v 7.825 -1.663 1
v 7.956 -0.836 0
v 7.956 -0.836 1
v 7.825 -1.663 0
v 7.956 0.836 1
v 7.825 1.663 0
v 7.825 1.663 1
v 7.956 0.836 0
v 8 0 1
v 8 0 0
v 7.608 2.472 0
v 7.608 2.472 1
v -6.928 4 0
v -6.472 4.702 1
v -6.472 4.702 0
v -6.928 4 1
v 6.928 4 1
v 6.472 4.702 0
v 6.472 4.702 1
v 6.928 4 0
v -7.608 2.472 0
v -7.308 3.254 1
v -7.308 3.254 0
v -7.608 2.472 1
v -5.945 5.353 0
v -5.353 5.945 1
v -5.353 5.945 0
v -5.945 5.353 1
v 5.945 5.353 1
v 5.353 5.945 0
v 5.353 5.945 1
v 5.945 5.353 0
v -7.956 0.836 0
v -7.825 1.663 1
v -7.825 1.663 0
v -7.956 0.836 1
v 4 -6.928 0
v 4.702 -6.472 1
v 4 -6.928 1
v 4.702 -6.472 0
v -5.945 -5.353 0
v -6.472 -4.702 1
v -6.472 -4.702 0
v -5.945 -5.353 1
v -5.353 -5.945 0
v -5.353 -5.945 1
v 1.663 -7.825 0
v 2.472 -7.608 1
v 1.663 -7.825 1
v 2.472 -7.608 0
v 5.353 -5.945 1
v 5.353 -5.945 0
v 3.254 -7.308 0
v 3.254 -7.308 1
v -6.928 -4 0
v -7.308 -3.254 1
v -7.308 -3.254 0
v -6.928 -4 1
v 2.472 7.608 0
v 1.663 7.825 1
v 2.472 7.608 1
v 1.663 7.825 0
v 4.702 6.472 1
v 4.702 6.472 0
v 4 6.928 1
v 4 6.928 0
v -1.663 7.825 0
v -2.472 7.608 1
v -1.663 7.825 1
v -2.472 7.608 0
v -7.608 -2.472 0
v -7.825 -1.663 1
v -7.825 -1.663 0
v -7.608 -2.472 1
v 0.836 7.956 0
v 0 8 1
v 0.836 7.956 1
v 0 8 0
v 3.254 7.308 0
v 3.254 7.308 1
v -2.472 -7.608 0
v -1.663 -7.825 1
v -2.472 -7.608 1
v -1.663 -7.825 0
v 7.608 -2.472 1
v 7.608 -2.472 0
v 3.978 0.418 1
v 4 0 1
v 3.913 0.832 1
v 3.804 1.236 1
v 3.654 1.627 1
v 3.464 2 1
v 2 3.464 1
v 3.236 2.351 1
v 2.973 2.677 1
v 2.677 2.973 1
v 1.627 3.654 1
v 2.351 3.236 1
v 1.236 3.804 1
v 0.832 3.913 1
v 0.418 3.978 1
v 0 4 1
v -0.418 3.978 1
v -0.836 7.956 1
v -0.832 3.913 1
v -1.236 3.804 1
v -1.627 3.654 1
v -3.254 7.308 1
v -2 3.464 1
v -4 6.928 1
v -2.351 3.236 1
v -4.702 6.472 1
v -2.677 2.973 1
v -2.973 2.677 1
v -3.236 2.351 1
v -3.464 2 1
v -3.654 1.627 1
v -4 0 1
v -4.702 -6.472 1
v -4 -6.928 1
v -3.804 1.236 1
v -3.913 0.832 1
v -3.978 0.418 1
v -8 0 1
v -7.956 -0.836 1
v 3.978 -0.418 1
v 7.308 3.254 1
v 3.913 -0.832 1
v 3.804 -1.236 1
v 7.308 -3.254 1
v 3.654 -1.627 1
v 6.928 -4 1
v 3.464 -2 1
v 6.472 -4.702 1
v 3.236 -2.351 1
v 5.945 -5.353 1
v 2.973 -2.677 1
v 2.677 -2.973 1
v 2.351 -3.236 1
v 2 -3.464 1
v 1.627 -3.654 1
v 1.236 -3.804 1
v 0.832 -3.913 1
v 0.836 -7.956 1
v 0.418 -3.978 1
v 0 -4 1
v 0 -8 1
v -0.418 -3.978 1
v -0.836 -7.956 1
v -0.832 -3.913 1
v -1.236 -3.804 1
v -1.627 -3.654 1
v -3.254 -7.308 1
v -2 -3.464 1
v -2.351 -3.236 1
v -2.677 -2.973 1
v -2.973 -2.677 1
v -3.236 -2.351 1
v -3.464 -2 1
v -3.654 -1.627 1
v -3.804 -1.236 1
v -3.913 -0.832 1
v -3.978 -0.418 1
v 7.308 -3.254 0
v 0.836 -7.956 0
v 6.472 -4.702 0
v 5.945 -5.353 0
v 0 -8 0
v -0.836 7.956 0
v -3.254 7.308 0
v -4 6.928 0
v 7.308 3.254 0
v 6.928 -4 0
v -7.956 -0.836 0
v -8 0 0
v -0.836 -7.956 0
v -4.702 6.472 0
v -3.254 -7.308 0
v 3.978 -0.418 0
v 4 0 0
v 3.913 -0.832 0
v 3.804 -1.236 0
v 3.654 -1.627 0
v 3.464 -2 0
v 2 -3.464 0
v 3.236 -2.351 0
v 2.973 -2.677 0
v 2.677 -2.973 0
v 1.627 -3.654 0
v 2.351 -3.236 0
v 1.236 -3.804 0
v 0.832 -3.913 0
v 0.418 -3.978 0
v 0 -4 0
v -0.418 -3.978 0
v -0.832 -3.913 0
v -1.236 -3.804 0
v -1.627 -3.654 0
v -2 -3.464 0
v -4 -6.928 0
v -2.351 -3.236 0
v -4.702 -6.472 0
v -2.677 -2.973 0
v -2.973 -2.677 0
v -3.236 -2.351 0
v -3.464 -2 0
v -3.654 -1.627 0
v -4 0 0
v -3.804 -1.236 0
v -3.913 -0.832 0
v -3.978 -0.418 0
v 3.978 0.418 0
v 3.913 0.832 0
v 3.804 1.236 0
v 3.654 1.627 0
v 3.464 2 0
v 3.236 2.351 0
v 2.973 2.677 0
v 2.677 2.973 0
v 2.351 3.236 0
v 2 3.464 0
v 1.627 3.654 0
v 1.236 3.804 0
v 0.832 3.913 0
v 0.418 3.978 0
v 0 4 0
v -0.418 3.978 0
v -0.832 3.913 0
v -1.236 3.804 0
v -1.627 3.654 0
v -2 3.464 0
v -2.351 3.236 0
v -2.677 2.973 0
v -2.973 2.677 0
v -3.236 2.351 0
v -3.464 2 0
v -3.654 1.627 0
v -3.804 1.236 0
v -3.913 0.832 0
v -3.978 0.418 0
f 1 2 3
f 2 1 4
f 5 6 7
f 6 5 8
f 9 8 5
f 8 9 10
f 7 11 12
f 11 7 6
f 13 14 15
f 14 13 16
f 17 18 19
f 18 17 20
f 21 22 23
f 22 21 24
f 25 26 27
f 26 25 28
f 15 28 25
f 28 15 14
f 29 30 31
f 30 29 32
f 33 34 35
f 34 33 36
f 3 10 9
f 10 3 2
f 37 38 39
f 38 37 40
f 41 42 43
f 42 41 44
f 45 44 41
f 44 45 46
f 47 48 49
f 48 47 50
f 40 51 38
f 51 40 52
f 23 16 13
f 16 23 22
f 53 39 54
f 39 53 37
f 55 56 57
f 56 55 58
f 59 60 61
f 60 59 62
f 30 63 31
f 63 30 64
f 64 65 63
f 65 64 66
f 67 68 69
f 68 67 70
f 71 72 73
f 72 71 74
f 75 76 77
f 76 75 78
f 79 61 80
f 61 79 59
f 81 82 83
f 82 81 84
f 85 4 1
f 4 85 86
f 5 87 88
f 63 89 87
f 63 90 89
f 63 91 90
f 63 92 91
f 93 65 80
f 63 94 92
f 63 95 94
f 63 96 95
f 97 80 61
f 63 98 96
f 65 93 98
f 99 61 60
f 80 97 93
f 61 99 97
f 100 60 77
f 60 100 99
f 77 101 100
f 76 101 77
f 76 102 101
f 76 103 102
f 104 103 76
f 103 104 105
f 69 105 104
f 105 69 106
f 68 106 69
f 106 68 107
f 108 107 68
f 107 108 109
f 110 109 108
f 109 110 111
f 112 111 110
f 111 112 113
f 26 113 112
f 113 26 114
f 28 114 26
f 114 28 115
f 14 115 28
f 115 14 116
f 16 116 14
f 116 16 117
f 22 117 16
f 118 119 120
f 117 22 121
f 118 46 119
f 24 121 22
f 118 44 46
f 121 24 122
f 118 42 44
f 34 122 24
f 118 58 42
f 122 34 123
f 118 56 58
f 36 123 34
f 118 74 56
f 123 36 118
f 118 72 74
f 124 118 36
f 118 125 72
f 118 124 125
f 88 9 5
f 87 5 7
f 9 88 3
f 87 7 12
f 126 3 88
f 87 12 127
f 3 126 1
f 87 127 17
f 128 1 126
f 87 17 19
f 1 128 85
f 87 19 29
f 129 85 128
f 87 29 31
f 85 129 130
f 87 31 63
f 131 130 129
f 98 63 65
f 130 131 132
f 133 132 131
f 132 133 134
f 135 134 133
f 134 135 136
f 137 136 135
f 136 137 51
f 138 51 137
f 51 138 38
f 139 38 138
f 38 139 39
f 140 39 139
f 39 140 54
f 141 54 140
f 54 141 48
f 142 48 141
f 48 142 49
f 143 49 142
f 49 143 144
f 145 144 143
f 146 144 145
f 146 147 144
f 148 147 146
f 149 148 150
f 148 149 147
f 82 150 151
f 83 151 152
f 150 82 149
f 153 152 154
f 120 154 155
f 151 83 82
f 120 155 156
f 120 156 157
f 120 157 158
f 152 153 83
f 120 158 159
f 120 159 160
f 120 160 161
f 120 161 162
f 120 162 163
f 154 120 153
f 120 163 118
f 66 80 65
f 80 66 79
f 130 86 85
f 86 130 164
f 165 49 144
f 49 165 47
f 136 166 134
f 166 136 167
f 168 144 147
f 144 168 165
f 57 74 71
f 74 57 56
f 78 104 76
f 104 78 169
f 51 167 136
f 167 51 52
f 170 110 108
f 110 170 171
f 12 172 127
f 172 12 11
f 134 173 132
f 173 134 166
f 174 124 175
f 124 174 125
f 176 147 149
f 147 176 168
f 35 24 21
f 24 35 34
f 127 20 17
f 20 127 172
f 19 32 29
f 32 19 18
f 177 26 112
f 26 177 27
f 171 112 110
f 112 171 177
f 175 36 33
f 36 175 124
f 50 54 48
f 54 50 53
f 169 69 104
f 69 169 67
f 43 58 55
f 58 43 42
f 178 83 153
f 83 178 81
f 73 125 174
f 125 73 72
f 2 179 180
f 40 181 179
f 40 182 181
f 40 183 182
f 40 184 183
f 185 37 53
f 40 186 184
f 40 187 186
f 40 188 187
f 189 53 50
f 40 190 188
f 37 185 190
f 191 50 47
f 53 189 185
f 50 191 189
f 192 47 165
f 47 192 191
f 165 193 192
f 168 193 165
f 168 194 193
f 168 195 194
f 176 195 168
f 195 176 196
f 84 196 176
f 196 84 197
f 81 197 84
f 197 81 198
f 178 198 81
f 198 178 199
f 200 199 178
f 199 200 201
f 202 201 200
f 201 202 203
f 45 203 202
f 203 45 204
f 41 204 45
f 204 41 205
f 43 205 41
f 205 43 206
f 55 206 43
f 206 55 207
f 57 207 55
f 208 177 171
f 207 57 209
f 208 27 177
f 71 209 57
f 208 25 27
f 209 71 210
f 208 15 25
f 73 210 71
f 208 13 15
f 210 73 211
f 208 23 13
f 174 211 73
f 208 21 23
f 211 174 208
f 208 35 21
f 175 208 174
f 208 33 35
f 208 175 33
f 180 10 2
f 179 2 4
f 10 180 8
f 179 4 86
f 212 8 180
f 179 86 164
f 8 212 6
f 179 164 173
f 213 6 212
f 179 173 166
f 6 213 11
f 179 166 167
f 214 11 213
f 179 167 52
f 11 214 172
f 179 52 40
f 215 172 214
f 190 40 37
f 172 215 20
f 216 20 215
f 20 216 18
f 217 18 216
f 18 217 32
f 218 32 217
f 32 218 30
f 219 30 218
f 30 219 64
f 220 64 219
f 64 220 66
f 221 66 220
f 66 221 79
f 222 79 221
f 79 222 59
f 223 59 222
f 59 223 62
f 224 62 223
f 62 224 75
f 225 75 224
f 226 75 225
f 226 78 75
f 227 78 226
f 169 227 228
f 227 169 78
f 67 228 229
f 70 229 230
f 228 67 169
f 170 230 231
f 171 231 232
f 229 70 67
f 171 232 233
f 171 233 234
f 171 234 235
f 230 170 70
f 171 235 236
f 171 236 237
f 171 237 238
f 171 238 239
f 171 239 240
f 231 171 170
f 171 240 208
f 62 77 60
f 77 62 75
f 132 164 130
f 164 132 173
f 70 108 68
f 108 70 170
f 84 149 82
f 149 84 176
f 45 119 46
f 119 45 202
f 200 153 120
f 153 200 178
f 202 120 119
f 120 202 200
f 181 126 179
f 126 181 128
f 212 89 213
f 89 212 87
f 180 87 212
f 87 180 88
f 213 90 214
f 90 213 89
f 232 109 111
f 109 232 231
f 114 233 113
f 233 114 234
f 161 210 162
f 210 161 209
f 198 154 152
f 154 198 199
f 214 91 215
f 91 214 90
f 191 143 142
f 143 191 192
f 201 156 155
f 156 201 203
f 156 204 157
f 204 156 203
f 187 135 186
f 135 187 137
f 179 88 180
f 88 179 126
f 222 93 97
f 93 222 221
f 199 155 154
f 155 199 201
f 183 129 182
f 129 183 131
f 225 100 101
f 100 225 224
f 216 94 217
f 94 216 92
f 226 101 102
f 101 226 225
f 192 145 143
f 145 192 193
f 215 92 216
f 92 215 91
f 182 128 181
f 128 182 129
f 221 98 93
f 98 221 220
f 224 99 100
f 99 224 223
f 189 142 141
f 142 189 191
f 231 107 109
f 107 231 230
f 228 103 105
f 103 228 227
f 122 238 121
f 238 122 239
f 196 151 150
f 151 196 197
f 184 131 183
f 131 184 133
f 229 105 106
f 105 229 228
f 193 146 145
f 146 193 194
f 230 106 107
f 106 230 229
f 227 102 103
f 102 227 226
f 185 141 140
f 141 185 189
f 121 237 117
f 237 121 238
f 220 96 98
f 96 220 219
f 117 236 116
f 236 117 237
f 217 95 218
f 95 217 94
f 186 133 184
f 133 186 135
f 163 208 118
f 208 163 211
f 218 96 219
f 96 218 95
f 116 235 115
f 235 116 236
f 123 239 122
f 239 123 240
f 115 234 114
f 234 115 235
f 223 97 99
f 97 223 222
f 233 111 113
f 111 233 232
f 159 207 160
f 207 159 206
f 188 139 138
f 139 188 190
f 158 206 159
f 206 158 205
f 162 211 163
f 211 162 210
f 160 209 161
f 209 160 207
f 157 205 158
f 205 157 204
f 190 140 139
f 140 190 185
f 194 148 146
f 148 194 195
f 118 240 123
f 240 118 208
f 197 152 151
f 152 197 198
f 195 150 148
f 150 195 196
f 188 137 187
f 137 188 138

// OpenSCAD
// Precision shim ring.
$fn = 60;
eps = 0.02;
inner_d = 8;
outer_d = 16;
thickness = 1;
difference() {
    cylinder(d = outer_d, h = thickness);
    translate([0, 0, -eps]) cylinder(d = inner_d, h = thickness + 2 * eps);
}
